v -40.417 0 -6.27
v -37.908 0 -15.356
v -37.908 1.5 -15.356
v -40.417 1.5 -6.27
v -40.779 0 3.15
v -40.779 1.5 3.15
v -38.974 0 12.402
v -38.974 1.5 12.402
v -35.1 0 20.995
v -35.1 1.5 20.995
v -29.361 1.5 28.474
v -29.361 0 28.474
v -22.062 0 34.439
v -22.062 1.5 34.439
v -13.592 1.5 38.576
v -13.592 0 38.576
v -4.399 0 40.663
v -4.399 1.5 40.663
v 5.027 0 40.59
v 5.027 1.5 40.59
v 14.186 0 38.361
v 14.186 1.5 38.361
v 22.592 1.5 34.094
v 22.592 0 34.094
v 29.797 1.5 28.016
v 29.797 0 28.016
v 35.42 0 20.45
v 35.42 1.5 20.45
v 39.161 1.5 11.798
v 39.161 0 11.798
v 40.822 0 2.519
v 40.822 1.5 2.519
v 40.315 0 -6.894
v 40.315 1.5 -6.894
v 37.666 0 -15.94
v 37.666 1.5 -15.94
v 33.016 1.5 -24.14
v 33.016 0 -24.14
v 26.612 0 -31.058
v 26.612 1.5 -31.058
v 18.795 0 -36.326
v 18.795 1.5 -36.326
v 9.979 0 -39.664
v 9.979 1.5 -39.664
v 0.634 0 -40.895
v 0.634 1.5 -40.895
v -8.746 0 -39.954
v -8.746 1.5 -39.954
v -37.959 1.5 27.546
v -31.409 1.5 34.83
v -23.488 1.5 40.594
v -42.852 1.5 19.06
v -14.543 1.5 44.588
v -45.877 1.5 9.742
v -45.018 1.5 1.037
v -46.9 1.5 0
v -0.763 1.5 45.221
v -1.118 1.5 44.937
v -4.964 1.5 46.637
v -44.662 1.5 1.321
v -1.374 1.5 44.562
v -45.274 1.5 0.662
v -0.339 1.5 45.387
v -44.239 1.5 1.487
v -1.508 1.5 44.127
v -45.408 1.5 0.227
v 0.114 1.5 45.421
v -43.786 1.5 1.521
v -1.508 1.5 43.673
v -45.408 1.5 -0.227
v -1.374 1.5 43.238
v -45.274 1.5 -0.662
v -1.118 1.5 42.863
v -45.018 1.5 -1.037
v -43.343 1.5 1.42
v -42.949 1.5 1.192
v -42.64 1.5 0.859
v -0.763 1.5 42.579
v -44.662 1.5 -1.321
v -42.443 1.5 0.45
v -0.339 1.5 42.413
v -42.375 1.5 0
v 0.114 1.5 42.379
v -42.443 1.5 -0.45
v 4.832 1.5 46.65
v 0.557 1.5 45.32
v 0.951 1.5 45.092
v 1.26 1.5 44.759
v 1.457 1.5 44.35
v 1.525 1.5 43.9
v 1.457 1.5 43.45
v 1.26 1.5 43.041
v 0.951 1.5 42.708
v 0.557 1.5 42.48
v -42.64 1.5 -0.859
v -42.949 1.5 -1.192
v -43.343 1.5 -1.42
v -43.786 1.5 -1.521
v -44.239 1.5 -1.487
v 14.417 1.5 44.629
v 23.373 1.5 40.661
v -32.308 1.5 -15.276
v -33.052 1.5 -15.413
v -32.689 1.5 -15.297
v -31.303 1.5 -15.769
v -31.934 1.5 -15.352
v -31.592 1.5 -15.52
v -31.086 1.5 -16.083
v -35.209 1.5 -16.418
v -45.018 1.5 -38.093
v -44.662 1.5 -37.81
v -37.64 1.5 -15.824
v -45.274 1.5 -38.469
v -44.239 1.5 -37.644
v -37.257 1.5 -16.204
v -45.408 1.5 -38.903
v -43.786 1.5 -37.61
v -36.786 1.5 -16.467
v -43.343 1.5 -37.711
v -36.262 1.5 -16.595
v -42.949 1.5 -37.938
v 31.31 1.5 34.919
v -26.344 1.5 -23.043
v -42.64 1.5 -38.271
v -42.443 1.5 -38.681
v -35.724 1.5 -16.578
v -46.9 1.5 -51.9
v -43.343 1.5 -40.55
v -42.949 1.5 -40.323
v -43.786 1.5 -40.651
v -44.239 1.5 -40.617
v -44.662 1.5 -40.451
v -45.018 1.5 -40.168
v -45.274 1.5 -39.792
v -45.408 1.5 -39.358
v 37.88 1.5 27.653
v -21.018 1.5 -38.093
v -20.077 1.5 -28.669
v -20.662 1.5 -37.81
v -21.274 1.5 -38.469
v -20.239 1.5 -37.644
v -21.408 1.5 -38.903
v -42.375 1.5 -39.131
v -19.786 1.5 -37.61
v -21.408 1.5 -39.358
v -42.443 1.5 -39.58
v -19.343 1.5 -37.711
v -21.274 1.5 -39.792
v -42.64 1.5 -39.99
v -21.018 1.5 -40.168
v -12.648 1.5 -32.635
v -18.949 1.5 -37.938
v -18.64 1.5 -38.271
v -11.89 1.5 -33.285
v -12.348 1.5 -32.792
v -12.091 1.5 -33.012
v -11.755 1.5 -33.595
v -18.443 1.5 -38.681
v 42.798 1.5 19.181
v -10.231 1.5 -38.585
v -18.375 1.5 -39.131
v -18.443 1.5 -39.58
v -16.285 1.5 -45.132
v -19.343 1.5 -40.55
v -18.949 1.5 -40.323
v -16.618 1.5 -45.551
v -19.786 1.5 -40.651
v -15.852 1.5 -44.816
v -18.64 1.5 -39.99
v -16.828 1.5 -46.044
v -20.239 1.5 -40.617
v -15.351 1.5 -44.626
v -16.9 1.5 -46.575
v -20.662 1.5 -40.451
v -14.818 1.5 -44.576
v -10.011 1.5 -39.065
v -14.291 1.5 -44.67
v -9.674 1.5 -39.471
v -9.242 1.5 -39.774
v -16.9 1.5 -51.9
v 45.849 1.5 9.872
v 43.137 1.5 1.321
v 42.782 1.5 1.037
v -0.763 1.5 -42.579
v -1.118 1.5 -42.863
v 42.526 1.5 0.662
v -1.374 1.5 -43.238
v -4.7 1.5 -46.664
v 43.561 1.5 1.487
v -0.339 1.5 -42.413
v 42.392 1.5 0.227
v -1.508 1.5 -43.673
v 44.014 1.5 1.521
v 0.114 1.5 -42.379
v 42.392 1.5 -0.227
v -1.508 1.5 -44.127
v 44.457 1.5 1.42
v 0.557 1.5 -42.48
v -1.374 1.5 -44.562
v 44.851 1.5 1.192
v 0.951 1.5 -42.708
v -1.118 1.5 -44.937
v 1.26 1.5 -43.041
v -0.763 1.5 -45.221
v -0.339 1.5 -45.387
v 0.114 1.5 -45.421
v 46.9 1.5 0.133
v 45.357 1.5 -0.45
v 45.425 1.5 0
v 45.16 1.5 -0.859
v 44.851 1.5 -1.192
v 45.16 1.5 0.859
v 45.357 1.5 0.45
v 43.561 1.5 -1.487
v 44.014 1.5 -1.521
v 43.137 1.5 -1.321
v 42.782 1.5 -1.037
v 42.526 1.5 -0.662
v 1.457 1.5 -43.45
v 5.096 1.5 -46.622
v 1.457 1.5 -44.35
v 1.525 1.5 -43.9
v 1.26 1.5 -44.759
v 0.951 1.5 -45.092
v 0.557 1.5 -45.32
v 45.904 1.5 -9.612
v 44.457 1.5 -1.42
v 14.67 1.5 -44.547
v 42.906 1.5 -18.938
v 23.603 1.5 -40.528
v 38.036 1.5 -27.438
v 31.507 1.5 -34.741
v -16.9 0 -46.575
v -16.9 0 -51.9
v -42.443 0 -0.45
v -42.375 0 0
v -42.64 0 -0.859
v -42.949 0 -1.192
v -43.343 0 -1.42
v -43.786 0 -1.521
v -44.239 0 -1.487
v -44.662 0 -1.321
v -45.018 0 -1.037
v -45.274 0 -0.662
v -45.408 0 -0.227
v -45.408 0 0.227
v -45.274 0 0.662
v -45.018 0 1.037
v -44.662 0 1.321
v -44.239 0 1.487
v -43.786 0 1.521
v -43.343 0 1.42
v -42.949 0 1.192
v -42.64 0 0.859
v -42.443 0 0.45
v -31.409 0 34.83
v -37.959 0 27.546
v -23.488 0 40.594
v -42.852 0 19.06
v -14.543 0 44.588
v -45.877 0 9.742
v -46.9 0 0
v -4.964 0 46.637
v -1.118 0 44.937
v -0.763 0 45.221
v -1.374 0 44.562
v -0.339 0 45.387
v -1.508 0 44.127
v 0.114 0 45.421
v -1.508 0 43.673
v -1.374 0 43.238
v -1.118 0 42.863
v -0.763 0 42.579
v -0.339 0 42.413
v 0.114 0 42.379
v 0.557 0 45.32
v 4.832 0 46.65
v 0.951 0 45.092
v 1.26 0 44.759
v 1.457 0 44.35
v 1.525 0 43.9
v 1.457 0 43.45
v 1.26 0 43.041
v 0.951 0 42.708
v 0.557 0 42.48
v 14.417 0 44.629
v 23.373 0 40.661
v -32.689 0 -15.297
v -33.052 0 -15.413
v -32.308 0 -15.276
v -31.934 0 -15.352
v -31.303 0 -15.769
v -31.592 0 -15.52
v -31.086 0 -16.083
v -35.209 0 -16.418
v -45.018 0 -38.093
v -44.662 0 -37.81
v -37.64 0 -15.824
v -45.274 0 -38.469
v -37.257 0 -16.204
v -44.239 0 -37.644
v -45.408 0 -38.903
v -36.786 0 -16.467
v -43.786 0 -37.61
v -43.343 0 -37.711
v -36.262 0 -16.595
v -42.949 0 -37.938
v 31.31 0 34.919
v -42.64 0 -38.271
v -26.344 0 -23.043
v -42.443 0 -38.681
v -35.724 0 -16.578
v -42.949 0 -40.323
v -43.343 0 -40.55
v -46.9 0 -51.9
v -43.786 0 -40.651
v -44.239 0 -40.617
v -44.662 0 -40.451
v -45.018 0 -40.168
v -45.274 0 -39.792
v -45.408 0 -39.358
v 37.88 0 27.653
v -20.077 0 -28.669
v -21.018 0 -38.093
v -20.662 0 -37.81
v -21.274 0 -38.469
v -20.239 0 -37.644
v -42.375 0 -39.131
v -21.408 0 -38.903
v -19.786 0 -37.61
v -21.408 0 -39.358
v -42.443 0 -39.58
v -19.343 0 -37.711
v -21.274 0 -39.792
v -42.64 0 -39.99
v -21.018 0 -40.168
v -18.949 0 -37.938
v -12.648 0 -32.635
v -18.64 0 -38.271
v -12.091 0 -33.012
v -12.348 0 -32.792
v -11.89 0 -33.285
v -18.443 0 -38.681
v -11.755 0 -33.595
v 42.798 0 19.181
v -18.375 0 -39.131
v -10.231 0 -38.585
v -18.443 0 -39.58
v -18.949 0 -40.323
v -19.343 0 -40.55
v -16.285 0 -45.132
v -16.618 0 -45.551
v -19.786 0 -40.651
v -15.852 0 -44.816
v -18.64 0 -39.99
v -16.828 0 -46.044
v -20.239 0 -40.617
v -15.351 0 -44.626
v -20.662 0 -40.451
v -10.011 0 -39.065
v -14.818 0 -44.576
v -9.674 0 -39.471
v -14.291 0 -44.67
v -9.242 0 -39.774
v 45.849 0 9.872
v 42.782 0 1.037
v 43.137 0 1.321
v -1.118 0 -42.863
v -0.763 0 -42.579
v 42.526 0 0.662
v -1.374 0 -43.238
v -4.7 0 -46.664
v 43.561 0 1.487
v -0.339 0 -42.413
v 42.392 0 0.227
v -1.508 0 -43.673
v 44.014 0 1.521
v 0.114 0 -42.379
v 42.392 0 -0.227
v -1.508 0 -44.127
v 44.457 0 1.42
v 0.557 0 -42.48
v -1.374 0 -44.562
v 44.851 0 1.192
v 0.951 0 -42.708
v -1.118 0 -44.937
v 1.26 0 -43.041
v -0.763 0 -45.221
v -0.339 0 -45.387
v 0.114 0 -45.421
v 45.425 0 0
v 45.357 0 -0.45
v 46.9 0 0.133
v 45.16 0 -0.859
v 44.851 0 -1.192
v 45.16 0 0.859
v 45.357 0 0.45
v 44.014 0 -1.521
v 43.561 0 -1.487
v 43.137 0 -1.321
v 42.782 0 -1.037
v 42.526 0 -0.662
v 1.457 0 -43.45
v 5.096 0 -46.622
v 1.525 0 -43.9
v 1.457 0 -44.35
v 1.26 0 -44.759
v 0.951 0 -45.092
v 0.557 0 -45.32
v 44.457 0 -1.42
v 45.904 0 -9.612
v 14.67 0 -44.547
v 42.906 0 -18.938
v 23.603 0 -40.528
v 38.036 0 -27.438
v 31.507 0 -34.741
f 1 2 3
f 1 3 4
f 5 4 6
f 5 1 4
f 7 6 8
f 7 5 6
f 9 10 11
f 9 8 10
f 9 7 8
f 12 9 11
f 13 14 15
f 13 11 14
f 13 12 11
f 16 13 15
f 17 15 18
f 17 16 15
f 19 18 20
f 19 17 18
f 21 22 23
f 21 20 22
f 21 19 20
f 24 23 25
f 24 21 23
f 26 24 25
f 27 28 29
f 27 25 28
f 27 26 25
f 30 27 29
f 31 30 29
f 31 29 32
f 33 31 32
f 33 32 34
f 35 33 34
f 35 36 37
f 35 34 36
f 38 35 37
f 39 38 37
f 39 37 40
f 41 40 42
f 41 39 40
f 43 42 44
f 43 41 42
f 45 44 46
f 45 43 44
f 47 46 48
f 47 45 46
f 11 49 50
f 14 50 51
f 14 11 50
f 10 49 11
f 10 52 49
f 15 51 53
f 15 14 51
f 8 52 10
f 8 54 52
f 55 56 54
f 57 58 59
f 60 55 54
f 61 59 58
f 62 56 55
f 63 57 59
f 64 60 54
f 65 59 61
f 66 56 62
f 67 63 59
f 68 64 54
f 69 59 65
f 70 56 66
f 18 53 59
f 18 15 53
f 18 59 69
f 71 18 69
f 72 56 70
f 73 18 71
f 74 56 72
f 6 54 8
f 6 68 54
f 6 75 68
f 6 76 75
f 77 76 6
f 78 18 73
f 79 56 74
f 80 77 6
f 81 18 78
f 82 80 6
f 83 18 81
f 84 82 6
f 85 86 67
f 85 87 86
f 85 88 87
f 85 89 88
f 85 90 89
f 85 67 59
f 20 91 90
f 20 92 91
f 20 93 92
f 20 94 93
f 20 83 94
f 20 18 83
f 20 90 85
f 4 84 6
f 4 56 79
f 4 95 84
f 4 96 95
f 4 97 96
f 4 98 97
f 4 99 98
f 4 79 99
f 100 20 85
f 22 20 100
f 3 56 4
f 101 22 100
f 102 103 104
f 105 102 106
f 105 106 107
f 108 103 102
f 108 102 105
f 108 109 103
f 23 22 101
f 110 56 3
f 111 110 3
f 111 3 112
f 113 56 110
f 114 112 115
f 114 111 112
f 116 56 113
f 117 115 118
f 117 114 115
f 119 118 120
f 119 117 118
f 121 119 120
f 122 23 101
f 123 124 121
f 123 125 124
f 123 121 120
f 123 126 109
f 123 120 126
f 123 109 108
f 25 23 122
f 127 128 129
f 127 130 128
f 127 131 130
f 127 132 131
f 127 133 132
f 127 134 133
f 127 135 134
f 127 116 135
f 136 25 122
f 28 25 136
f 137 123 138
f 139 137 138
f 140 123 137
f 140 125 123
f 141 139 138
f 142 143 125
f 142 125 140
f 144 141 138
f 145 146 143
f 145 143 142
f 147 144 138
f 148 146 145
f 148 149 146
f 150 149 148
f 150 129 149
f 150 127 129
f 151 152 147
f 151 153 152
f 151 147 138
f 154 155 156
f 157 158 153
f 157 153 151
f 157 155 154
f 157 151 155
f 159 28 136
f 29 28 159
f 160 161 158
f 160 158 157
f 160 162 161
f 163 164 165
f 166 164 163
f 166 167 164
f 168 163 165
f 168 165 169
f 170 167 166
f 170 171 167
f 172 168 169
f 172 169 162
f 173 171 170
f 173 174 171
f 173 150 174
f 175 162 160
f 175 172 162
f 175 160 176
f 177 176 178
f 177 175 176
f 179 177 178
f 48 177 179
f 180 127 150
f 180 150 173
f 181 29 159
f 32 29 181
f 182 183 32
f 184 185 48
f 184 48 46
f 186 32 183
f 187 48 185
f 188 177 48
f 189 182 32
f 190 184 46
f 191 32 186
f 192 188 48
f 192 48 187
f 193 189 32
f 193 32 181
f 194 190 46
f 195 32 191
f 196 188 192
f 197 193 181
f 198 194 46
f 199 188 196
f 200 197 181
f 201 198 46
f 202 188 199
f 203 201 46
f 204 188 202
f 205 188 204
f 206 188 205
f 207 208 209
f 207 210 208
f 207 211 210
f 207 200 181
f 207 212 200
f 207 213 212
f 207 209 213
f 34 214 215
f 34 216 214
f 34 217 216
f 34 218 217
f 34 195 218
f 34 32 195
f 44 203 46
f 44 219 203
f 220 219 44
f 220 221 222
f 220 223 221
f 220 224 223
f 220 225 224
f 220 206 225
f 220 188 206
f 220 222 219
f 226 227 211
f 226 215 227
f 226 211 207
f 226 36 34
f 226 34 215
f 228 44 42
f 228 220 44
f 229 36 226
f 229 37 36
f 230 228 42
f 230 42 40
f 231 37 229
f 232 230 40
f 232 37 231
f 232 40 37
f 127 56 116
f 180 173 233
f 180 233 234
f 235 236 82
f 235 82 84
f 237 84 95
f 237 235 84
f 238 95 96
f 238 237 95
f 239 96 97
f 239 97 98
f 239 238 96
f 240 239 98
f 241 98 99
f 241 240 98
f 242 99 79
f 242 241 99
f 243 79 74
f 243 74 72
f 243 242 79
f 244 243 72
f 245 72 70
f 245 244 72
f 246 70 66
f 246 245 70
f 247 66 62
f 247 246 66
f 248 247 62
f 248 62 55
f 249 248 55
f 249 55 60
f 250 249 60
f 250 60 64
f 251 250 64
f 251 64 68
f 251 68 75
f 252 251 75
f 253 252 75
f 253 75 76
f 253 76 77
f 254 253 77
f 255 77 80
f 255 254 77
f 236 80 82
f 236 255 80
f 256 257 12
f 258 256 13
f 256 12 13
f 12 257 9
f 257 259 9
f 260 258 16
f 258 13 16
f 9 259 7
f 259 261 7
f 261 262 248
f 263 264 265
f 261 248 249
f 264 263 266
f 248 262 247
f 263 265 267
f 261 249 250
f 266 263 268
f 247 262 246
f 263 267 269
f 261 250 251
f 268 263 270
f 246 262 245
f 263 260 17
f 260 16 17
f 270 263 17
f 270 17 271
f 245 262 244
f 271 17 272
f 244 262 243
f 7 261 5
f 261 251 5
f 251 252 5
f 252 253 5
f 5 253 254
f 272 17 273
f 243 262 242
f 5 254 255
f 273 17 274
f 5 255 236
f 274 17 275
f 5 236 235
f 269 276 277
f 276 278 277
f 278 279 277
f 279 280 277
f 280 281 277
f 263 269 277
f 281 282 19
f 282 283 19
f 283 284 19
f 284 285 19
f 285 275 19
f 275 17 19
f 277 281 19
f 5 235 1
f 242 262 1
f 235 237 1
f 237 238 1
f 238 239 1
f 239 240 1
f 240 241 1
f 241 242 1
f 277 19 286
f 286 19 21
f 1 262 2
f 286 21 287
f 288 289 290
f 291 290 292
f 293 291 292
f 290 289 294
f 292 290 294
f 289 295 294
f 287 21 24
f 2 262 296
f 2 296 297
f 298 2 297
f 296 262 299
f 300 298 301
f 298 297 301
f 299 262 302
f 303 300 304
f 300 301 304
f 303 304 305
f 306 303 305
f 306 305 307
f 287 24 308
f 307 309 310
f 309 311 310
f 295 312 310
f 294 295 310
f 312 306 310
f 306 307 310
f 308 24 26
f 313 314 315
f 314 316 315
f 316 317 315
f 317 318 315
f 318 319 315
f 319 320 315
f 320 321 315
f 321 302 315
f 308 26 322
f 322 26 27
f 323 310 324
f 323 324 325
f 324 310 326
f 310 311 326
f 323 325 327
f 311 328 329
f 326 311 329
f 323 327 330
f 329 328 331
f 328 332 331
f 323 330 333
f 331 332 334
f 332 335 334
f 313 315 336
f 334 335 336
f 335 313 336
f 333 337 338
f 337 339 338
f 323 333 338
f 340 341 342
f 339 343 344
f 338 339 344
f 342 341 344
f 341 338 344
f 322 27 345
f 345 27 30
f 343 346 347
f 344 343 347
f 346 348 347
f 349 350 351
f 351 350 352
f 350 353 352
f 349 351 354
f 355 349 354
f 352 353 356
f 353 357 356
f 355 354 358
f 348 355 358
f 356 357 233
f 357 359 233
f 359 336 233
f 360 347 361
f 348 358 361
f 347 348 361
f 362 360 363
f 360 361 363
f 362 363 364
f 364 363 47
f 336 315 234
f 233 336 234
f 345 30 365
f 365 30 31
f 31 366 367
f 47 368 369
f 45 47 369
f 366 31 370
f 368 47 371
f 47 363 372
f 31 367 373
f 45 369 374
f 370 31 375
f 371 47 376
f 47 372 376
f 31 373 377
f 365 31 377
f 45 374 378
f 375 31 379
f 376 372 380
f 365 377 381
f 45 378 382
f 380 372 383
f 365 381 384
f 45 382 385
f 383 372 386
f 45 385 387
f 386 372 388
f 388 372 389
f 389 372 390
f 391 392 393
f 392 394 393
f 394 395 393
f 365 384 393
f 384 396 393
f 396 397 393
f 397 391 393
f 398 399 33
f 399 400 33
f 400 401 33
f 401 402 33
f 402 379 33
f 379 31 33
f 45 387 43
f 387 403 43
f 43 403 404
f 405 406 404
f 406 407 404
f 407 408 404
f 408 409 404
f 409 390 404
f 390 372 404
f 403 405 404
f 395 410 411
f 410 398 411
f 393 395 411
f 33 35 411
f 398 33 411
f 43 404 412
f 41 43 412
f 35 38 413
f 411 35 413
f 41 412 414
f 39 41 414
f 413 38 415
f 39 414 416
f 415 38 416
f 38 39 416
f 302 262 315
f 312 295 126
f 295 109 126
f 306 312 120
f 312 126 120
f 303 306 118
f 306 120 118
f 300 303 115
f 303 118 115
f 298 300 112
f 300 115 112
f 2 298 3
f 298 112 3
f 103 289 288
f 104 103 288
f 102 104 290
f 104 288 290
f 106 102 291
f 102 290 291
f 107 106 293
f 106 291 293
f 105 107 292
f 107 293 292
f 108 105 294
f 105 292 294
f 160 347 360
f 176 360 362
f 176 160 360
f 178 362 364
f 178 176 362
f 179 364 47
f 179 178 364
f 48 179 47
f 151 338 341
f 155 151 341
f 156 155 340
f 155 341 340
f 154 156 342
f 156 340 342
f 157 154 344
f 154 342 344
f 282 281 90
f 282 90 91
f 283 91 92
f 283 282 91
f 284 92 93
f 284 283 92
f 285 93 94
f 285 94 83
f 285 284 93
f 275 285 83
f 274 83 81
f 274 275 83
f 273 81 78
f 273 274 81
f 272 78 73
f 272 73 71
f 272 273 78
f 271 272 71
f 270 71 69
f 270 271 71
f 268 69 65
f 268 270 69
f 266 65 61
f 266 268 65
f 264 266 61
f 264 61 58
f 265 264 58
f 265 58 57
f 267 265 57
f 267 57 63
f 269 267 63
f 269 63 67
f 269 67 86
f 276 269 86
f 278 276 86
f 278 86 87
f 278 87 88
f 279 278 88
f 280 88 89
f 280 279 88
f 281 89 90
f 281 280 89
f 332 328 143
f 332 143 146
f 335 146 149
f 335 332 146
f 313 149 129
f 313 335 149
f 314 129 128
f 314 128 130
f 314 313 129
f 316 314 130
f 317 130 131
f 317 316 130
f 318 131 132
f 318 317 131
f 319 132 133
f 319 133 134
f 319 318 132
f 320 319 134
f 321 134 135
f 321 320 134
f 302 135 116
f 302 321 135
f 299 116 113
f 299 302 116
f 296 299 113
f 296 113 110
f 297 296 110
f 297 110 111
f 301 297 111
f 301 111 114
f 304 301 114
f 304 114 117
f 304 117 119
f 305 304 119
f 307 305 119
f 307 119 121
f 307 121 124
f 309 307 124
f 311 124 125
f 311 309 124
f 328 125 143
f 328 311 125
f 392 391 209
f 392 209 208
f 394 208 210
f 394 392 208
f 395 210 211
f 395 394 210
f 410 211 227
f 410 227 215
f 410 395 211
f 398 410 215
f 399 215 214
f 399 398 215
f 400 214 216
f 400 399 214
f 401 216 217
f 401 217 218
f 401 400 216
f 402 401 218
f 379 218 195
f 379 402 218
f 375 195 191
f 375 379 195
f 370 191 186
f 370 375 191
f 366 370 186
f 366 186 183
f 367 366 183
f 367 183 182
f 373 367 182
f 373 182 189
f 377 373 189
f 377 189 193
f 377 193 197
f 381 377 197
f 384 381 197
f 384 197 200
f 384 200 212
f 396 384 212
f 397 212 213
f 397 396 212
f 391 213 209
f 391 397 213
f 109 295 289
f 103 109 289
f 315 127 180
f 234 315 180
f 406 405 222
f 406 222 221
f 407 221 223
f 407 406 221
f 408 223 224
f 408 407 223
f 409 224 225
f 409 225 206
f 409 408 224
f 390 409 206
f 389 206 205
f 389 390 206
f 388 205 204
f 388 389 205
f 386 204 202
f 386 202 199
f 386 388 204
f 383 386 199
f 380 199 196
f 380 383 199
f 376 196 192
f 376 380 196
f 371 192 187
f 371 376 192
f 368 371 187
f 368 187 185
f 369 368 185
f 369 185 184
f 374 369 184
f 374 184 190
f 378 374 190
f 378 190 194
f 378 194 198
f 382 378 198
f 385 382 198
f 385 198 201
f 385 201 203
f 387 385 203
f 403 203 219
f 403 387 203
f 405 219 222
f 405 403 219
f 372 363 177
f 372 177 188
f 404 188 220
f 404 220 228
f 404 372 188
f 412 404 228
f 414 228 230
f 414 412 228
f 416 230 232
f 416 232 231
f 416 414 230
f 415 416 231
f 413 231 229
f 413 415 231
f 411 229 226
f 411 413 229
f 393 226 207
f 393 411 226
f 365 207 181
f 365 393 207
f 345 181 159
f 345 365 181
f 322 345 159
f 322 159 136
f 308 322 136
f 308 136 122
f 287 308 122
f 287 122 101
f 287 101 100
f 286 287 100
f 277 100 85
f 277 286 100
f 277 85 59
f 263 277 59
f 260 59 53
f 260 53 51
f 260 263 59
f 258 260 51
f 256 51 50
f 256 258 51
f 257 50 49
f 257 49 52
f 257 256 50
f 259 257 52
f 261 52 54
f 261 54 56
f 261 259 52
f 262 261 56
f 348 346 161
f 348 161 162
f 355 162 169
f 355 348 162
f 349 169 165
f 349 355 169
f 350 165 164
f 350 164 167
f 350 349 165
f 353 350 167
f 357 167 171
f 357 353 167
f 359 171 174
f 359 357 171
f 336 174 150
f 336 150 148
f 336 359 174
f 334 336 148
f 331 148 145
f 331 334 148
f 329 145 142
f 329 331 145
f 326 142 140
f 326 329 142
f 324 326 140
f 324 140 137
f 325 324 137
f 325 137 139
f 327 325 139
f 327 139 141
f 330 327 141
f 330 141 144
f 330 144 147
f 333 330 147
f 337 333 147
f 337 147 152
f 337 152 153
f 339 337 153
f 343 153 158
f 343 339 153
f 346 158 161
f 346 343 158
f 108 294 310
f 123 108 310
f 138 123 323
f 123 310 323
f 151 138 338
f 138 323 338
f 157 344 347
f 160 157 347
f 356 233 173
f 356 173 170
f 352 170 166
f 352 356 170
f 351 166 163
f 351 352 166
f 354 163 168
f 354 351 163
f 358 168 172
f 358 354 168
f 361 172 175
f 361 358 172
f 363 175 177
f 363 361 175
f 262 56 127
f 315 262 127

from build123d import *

# Parameters (mm, degrees)
SKETCH_1_R      = 40.9
SKETCH_1_R_2    = 1.525
EXTRUDE_1_DEPTH = 1.5
EXTRUDE_3_DEPTH = 1.5
FILLET_1_R      = 2
SKETCH_3_W      = 30
SKETCH_3_H      = 5
EXTRUDE_4_DEPTH = 1.5


with BuildPart() as part:
    # 草图1 → 凸台-拉伸1 (new body)
    with BuildSketch(Plane(origin=(0, 0, 0), x_dir=(1, 0, 0), z_dir=(0, 1, 0))):
        with BuildLine():
            Line((-46.9, 0), (-46.9, 46.9))
            Line((-46.9, 46.9), (-16.9, 46.9))
            Line((-16.9, 46.9), (-16.9, 46.574671228))
            ThreePointArc((-16.9, 46.574671228), (-16.079234093, 44.95930534), (-14.290593047, 44.669776699))
            ThreePointArc((-14.290593047, 44.669776699), (37.88033008, -27.65303949), (-46.9, 0))
        make_face()
        Circle(SKETCH_1_R, mode=Mode.SUBTRACT)
        with Locations((-19.9, 39.130550724)):
            Circle(SKETCH_1_R_2, mode=Mode.SUBTRACT)
        with Locations((0, 43.9)):
            Circle(SKETCH_1_R_2, mode=Mode.SUBTRACT)
        with Locations((43.9, 0)):
            Circle(SKETCH_1_R_2, mode=Mode.SUBTRACT)
        with Locations((0, -43.9)):
            Circle(SKETCH_1_R_2, mode=Mode.SUBTRACT)
        with Locations((-43.9, 0)):
            Circle(SKETCH_1_R_2, mode=Mode.SUBTRACT)
        with Locations((-43.9, 39.130550724)):
            Circle(SKETCH_1_R_2, mode=Mode.SUBTRACT)
    extrude(amount=EXTRUDE_1_DEPTH)

    # 草图2 → 凸台-拉伸3 (add)
    with BuildSketch(Plane(origin=(0, 0, 0), x_dir=(1, 0, 0), z_dir=(0, 1, 0))):
        with BuildLine():
            Line((-37.06798849, 17.285086905), (-33.052288278, 15.412535144))
            ThreePointArc((-33.052288278, 15.412535144), (-31.934408281, 15.352211673), (-31.08609948, 16.082736681))
            ThreePointArc((-31.08609948, 16.082736681), (-23.380571231, 26.04513177), (-12.647507481, 32.634959086))
            ThreePointArc((-12.647507481, 32.634959086), (-12.090765455, 33.012479837), (-11.754991898, 33.595351795))
            Line((-11.754991898, 33.595351795), (-9.89460553, 39.685095205))
            ThreePointArc((-9.89460553, 39.685095205), (-26.015599209, 31.559445461), (-37.06798849, 17.285086905))
        make_face()
    extrude(amount=EXTRUDE_3_DEPTH)

    # 圆角1
    fillet_1_edges = [part.edges().sort_by_distance(p)[0] for p in [
        (-9.89460553, 0.75, -39.685095205),
        (-37.06798849, 0.75, -17.285086905),
    ]]
    fillet(fillet_1_edges, radius=FILLET_1_R)

    # 草图3 → 凸台-拉伸4 (add)
    with BuildSketch(Plane(origin=(0, 1.5, 0), x_dir=(1, 0, 0), z_dir=(0, 1, 0))):
        with Locations((-31.9, 49.4)):
            Rectangle(SKETCH_3_W, SKETCH_3_H)
    extrude(amount=-EXTRUDE_4_DEPTH)


solid = part.part
